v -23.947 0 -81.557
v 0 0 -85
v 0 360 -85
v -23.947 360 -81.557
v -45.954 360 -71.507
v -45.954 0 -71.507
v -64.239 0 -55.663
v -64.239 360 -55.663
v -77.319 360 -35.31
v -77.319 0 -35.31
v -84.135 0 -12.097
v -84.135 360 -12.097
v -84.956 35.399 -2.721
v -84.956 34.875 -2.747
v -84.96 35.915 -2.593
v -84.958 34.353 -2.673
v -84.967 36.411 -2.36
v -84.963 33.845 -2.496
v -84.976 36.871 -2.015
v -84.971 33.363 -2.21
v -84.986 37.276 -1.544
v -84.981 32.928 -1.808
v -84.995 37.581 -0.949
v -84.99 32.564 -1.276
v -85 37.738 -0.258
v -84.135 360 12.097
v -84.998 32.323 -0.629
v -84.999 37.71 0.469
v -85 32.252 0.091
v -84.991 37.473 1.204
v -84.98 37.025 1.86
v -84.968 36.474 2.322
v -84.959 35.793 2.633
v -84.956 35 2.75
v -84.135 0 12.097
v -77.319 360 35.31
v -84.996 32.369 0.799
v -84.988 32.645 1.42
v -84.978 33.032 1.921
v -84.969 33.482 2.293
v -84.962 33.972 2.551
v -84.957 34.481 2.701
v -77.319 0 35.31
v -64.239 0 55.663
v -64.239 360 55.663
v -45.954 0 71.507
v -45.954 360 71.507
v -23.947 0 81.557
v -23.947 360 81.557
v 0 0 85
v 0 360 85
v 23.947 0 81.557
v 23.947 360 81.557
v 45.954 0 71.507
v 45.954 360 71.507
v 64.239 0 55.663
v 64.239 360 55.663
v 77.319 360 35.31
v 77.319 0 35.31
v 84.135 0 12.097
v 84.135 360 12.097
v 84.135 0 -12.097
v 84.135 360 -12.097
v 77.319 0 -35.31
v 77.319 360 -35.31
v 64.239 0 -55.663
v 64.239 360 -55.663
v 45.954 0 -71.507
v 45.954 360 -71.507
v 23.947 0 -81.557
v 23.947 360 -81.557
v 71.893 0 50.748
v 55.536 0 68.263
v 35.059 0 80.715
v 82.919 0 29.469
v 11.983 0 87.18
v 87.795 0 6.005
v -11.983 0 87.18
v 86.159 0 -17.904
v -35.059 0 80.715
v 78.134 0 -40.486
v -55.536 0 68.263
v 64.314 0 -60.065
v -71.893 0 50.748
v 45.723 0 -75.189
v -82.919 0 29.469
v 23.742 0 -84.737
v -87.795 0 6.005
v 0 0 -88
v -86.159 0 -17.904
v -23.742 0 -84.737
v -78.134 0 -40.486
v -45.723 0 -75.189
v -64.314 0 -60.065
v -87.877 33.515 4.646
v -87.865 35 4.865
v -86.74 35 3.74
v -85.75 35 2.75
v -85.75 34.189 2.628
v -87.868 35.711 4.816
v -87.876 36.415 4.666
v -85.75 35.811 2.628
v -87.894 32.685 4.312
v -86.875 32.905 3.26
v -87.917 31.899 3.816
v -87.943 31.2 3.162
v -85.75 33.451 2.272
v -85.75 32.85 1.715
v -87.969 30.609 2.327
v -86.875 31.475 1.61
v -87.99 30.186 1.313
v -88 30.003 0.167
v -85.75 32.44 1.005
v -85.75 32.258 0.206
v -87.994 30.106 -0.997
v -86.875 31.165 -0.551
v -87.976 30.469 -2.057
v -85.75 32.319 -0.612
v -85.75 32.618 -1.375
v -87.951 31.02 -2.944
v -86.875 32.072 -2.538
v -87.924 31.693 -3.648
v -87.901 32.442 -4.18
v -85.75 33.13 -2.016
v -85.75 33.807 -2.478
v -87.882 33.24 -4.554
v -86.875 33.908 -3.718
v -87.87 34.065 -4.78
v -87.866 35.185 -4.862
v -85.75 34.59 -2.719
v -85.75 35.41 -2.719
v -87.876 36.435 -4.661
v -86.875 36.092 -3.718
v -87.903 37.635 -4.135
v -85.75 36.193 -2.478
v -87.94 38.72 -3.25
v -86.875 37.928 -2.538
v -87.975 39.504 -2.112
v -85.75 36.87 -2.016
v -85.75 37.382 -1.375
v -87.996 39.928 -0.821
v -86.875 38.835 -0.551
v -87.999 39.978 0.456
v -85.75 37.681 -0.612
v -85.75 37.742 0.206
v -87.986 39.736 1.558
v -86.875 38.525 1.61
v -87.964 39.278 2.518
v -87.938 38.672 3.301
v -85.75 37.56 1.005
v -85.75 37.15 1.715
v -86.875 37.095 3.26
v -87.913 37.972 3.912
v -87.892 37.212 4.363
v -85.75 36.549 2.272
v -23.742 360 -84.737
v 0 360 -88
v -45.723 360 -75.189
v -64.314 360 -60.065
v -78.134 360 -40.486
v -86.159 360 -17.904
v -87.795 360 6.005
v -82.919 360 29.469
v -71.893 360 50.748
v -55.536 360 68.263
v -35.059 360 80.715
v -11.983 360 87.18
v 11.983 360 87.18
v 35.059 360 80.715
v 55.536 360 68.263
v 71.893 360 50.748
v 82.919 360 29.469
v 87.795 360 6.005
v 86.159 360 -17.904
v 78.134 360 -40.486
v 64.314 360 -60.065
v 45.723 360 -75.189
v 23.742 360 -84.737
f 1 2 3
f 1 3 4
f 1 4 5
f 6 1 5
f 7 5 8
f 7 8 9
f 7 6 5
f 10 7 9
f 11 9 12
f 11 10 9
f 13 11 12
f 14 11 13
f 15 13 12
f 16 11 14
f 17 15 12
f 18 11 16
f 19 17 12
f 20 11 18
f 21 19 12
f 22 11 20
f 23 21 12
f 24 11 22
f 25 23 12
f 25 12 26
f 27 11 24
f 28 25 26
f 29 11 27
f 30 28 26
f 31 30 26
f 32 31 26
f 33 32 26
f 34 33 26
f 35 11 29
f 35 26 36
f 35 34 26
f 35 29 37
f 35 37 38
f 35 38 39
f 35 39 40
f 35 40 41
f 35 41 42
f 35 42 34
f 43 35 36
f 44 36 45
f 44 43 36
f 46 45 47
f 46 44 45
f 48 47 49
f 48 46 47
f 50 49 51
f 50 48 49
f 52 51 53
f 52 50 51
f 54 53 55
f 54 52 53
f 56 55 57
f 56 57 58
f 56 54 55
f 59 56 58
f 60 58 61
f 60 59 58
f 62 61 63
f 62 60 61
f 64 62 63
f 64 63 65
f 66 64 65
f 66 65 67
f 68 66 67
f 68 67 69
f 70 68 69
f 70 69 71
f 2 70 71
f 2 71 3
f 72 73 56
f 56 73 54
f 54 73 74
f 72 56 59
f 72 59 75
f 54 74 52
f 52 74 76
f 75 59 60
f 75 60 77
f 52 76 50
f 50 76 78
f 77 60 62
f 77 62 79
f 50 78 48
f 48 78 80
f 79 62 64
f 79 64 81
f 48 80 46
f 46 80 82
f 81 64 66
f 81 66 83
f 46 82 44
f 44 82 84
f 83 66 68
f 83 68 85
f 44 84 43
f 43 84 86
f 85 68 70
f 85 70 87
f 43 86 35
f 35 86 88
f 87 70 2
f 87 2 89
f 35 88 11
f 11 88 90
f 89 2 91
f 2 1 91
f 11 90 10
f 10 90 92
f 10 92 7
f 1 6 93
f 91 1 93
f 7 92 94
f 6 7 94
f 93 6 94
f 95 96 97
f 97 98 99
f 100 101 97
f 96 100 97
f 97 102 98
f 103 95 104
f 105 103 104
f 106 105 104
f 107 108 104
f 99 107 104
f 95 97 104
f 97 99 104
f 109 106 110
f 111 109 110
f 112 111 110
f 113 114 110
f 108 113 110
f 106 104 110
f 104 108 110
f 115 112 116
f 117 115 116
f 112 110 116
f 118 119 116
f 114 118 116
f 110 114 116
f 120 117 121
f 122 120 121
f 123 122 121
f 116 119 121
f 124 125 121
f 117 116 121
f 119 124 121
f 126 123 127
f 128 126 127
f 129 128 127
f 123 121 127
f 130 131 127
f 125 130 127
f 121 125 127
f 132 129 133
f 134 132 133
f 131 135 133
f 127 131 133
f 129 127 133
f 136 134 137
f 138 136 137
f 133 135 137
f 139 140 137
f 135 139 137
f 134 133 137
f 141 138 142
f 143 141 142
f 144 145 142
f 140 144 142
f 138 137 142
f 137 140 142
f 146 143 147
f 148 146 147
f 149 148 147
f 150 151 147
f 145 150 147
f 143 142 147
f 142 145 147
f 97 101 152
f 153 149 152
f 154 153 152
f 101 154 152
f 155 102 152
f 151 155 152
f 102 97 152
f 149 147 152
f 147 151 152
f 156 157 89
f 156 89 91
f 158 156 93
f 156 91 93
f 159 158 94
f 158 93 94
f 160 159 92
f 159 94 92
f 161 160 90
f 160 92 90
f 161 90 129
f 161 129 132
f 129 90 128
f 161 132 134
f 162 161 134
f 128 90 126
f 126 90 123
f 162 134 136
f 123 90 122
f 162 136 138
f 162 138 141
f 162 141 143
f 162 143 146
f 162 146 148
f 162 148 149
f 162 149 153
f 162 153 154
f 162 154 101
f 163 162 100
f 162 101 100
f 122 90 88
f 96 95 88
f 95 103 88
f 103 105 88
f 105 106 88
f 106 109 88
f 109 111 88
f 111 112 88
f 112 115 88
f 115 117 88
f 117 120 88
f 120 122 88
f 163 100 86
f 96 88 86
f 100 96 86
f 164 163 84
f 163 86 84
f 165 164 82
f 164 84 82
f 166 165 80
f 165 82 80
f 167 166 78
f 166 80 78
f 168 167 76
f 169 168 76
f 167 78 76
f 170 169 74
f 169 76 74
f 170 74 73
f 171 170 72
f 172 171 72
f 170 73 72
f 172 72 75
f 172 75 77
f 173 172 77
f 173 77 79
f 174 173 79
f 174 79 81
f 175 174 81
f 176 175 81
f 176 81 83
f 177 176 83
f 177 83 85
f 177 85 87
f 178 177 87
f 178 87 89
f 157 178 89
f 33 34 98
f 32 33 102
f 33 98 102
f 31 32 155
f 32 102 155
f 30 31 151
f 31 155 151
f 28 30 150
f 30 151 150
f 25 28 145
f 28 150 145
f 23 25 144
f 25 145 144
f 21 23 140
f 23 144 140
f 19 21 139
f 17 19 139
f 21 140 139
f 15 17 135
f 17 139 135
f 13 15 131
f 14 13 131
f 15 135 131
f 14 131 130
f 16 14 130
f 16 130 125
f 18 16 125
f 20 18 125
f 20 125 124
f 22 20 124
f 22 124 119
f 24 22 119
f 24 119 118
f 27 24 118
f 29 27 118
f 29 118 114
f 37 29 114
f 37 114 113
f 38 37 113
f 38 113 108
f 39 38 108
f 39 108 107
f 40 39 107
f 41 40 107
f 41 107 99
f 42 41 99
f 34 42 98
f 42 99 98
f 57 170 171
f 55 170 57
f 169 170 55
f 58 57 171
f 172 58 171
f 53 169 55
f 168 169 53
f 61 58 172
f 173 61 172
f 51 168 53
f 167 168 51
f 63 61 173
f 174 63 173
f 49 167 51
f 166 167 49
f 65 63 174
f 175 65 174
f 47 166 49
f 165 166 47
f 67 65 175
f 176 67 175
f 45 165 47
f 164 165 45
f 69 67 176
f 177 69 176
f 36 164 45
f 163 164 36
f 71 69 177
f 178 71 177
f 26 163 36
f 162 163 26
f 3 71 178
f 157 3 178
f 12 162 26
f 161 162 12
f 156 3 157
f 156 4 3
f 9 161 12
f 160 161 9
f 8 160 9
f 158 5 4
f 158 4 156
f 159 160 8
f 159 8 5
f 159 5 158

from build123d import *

# Parameters (mm, degrees)
SKETCH1_R               = 88
SKETCH1_R_2             = 85
BOSS_EXTRUDE1_DEPTH     = 360
CUT_EXTRUDE1_REACH      = 412.268
CUT_EXTRUDE1_END_RADIUS = 85
SKETCH2_R               = 2.75


with BuildPart() as part:
    # Sketch1 → Boss-Extrude1 (new body)
    with BuildSketch(Plane(origin=(0, 0, 0), x_dir=(1, 0, 0), z_dir=(0, 1, 0))):
        with Locations(Location((0, 0, 0), (0, 0, 90))):
            Circle(SKETCH1_R)
        with Locations(Location((0, 0, 0), (0, 0, 90))):
            Circle(SKETCH1_R_2, mode=Mode.SUBTRACT)
    extrude(amount=BOSS_EXTRUDE1_DEPTH)

    # Cut-Extrude1: up to this cylinder (the profile starts outside it)
    cut_extrude1_end = Plane(origin=(0, 35, 0), z_dir=(0, -1, 0)) * Cylinder(CUT_EXTRUDE1_END_RADIUS, 995.536, mode=Mode.PRIVATE)
    # Sketch2 → Cut-Extrude1 (cut, up to the surface)
    with BuildSketch(Plane.ZY.offset(88), mode=Mode.PRIVATE) as cut_extrude1_sk1:
        with Locations((0, 35)):
            Circle(SKETCH2_R)
    cut_extrude1_tool1 = extrude(cut_extrude1_sk1.sketch, amount=-CUT_EXTRUDE1_REACH, mode=Mode.PRIVATE) - cut_extrude1_end
    add(cut_extrude1_tool1.solids().sort_by_distance((-88, 35, 0))[0], mode=Mode.SUBTRACT)

    # Sketch4 → Cut-Revolve1 (revolve, cut)
    with BuildSketch(Plane.XZ.offset(-35), mode=Mode.PRIVATE) as cut_revolve1_sk:
        Polygon((-88, 0), (-88, -5), (-83, 0), align=None)
    revolve(cut_revolve1_sk.sketch.rotate(Axis((-88, 35, 0), (1, 0, 0)), 180), axis=Axis((-88, 35, 0), (1, 0, 0)), mode=Mode.SUBTRACT)


solid = part.part
